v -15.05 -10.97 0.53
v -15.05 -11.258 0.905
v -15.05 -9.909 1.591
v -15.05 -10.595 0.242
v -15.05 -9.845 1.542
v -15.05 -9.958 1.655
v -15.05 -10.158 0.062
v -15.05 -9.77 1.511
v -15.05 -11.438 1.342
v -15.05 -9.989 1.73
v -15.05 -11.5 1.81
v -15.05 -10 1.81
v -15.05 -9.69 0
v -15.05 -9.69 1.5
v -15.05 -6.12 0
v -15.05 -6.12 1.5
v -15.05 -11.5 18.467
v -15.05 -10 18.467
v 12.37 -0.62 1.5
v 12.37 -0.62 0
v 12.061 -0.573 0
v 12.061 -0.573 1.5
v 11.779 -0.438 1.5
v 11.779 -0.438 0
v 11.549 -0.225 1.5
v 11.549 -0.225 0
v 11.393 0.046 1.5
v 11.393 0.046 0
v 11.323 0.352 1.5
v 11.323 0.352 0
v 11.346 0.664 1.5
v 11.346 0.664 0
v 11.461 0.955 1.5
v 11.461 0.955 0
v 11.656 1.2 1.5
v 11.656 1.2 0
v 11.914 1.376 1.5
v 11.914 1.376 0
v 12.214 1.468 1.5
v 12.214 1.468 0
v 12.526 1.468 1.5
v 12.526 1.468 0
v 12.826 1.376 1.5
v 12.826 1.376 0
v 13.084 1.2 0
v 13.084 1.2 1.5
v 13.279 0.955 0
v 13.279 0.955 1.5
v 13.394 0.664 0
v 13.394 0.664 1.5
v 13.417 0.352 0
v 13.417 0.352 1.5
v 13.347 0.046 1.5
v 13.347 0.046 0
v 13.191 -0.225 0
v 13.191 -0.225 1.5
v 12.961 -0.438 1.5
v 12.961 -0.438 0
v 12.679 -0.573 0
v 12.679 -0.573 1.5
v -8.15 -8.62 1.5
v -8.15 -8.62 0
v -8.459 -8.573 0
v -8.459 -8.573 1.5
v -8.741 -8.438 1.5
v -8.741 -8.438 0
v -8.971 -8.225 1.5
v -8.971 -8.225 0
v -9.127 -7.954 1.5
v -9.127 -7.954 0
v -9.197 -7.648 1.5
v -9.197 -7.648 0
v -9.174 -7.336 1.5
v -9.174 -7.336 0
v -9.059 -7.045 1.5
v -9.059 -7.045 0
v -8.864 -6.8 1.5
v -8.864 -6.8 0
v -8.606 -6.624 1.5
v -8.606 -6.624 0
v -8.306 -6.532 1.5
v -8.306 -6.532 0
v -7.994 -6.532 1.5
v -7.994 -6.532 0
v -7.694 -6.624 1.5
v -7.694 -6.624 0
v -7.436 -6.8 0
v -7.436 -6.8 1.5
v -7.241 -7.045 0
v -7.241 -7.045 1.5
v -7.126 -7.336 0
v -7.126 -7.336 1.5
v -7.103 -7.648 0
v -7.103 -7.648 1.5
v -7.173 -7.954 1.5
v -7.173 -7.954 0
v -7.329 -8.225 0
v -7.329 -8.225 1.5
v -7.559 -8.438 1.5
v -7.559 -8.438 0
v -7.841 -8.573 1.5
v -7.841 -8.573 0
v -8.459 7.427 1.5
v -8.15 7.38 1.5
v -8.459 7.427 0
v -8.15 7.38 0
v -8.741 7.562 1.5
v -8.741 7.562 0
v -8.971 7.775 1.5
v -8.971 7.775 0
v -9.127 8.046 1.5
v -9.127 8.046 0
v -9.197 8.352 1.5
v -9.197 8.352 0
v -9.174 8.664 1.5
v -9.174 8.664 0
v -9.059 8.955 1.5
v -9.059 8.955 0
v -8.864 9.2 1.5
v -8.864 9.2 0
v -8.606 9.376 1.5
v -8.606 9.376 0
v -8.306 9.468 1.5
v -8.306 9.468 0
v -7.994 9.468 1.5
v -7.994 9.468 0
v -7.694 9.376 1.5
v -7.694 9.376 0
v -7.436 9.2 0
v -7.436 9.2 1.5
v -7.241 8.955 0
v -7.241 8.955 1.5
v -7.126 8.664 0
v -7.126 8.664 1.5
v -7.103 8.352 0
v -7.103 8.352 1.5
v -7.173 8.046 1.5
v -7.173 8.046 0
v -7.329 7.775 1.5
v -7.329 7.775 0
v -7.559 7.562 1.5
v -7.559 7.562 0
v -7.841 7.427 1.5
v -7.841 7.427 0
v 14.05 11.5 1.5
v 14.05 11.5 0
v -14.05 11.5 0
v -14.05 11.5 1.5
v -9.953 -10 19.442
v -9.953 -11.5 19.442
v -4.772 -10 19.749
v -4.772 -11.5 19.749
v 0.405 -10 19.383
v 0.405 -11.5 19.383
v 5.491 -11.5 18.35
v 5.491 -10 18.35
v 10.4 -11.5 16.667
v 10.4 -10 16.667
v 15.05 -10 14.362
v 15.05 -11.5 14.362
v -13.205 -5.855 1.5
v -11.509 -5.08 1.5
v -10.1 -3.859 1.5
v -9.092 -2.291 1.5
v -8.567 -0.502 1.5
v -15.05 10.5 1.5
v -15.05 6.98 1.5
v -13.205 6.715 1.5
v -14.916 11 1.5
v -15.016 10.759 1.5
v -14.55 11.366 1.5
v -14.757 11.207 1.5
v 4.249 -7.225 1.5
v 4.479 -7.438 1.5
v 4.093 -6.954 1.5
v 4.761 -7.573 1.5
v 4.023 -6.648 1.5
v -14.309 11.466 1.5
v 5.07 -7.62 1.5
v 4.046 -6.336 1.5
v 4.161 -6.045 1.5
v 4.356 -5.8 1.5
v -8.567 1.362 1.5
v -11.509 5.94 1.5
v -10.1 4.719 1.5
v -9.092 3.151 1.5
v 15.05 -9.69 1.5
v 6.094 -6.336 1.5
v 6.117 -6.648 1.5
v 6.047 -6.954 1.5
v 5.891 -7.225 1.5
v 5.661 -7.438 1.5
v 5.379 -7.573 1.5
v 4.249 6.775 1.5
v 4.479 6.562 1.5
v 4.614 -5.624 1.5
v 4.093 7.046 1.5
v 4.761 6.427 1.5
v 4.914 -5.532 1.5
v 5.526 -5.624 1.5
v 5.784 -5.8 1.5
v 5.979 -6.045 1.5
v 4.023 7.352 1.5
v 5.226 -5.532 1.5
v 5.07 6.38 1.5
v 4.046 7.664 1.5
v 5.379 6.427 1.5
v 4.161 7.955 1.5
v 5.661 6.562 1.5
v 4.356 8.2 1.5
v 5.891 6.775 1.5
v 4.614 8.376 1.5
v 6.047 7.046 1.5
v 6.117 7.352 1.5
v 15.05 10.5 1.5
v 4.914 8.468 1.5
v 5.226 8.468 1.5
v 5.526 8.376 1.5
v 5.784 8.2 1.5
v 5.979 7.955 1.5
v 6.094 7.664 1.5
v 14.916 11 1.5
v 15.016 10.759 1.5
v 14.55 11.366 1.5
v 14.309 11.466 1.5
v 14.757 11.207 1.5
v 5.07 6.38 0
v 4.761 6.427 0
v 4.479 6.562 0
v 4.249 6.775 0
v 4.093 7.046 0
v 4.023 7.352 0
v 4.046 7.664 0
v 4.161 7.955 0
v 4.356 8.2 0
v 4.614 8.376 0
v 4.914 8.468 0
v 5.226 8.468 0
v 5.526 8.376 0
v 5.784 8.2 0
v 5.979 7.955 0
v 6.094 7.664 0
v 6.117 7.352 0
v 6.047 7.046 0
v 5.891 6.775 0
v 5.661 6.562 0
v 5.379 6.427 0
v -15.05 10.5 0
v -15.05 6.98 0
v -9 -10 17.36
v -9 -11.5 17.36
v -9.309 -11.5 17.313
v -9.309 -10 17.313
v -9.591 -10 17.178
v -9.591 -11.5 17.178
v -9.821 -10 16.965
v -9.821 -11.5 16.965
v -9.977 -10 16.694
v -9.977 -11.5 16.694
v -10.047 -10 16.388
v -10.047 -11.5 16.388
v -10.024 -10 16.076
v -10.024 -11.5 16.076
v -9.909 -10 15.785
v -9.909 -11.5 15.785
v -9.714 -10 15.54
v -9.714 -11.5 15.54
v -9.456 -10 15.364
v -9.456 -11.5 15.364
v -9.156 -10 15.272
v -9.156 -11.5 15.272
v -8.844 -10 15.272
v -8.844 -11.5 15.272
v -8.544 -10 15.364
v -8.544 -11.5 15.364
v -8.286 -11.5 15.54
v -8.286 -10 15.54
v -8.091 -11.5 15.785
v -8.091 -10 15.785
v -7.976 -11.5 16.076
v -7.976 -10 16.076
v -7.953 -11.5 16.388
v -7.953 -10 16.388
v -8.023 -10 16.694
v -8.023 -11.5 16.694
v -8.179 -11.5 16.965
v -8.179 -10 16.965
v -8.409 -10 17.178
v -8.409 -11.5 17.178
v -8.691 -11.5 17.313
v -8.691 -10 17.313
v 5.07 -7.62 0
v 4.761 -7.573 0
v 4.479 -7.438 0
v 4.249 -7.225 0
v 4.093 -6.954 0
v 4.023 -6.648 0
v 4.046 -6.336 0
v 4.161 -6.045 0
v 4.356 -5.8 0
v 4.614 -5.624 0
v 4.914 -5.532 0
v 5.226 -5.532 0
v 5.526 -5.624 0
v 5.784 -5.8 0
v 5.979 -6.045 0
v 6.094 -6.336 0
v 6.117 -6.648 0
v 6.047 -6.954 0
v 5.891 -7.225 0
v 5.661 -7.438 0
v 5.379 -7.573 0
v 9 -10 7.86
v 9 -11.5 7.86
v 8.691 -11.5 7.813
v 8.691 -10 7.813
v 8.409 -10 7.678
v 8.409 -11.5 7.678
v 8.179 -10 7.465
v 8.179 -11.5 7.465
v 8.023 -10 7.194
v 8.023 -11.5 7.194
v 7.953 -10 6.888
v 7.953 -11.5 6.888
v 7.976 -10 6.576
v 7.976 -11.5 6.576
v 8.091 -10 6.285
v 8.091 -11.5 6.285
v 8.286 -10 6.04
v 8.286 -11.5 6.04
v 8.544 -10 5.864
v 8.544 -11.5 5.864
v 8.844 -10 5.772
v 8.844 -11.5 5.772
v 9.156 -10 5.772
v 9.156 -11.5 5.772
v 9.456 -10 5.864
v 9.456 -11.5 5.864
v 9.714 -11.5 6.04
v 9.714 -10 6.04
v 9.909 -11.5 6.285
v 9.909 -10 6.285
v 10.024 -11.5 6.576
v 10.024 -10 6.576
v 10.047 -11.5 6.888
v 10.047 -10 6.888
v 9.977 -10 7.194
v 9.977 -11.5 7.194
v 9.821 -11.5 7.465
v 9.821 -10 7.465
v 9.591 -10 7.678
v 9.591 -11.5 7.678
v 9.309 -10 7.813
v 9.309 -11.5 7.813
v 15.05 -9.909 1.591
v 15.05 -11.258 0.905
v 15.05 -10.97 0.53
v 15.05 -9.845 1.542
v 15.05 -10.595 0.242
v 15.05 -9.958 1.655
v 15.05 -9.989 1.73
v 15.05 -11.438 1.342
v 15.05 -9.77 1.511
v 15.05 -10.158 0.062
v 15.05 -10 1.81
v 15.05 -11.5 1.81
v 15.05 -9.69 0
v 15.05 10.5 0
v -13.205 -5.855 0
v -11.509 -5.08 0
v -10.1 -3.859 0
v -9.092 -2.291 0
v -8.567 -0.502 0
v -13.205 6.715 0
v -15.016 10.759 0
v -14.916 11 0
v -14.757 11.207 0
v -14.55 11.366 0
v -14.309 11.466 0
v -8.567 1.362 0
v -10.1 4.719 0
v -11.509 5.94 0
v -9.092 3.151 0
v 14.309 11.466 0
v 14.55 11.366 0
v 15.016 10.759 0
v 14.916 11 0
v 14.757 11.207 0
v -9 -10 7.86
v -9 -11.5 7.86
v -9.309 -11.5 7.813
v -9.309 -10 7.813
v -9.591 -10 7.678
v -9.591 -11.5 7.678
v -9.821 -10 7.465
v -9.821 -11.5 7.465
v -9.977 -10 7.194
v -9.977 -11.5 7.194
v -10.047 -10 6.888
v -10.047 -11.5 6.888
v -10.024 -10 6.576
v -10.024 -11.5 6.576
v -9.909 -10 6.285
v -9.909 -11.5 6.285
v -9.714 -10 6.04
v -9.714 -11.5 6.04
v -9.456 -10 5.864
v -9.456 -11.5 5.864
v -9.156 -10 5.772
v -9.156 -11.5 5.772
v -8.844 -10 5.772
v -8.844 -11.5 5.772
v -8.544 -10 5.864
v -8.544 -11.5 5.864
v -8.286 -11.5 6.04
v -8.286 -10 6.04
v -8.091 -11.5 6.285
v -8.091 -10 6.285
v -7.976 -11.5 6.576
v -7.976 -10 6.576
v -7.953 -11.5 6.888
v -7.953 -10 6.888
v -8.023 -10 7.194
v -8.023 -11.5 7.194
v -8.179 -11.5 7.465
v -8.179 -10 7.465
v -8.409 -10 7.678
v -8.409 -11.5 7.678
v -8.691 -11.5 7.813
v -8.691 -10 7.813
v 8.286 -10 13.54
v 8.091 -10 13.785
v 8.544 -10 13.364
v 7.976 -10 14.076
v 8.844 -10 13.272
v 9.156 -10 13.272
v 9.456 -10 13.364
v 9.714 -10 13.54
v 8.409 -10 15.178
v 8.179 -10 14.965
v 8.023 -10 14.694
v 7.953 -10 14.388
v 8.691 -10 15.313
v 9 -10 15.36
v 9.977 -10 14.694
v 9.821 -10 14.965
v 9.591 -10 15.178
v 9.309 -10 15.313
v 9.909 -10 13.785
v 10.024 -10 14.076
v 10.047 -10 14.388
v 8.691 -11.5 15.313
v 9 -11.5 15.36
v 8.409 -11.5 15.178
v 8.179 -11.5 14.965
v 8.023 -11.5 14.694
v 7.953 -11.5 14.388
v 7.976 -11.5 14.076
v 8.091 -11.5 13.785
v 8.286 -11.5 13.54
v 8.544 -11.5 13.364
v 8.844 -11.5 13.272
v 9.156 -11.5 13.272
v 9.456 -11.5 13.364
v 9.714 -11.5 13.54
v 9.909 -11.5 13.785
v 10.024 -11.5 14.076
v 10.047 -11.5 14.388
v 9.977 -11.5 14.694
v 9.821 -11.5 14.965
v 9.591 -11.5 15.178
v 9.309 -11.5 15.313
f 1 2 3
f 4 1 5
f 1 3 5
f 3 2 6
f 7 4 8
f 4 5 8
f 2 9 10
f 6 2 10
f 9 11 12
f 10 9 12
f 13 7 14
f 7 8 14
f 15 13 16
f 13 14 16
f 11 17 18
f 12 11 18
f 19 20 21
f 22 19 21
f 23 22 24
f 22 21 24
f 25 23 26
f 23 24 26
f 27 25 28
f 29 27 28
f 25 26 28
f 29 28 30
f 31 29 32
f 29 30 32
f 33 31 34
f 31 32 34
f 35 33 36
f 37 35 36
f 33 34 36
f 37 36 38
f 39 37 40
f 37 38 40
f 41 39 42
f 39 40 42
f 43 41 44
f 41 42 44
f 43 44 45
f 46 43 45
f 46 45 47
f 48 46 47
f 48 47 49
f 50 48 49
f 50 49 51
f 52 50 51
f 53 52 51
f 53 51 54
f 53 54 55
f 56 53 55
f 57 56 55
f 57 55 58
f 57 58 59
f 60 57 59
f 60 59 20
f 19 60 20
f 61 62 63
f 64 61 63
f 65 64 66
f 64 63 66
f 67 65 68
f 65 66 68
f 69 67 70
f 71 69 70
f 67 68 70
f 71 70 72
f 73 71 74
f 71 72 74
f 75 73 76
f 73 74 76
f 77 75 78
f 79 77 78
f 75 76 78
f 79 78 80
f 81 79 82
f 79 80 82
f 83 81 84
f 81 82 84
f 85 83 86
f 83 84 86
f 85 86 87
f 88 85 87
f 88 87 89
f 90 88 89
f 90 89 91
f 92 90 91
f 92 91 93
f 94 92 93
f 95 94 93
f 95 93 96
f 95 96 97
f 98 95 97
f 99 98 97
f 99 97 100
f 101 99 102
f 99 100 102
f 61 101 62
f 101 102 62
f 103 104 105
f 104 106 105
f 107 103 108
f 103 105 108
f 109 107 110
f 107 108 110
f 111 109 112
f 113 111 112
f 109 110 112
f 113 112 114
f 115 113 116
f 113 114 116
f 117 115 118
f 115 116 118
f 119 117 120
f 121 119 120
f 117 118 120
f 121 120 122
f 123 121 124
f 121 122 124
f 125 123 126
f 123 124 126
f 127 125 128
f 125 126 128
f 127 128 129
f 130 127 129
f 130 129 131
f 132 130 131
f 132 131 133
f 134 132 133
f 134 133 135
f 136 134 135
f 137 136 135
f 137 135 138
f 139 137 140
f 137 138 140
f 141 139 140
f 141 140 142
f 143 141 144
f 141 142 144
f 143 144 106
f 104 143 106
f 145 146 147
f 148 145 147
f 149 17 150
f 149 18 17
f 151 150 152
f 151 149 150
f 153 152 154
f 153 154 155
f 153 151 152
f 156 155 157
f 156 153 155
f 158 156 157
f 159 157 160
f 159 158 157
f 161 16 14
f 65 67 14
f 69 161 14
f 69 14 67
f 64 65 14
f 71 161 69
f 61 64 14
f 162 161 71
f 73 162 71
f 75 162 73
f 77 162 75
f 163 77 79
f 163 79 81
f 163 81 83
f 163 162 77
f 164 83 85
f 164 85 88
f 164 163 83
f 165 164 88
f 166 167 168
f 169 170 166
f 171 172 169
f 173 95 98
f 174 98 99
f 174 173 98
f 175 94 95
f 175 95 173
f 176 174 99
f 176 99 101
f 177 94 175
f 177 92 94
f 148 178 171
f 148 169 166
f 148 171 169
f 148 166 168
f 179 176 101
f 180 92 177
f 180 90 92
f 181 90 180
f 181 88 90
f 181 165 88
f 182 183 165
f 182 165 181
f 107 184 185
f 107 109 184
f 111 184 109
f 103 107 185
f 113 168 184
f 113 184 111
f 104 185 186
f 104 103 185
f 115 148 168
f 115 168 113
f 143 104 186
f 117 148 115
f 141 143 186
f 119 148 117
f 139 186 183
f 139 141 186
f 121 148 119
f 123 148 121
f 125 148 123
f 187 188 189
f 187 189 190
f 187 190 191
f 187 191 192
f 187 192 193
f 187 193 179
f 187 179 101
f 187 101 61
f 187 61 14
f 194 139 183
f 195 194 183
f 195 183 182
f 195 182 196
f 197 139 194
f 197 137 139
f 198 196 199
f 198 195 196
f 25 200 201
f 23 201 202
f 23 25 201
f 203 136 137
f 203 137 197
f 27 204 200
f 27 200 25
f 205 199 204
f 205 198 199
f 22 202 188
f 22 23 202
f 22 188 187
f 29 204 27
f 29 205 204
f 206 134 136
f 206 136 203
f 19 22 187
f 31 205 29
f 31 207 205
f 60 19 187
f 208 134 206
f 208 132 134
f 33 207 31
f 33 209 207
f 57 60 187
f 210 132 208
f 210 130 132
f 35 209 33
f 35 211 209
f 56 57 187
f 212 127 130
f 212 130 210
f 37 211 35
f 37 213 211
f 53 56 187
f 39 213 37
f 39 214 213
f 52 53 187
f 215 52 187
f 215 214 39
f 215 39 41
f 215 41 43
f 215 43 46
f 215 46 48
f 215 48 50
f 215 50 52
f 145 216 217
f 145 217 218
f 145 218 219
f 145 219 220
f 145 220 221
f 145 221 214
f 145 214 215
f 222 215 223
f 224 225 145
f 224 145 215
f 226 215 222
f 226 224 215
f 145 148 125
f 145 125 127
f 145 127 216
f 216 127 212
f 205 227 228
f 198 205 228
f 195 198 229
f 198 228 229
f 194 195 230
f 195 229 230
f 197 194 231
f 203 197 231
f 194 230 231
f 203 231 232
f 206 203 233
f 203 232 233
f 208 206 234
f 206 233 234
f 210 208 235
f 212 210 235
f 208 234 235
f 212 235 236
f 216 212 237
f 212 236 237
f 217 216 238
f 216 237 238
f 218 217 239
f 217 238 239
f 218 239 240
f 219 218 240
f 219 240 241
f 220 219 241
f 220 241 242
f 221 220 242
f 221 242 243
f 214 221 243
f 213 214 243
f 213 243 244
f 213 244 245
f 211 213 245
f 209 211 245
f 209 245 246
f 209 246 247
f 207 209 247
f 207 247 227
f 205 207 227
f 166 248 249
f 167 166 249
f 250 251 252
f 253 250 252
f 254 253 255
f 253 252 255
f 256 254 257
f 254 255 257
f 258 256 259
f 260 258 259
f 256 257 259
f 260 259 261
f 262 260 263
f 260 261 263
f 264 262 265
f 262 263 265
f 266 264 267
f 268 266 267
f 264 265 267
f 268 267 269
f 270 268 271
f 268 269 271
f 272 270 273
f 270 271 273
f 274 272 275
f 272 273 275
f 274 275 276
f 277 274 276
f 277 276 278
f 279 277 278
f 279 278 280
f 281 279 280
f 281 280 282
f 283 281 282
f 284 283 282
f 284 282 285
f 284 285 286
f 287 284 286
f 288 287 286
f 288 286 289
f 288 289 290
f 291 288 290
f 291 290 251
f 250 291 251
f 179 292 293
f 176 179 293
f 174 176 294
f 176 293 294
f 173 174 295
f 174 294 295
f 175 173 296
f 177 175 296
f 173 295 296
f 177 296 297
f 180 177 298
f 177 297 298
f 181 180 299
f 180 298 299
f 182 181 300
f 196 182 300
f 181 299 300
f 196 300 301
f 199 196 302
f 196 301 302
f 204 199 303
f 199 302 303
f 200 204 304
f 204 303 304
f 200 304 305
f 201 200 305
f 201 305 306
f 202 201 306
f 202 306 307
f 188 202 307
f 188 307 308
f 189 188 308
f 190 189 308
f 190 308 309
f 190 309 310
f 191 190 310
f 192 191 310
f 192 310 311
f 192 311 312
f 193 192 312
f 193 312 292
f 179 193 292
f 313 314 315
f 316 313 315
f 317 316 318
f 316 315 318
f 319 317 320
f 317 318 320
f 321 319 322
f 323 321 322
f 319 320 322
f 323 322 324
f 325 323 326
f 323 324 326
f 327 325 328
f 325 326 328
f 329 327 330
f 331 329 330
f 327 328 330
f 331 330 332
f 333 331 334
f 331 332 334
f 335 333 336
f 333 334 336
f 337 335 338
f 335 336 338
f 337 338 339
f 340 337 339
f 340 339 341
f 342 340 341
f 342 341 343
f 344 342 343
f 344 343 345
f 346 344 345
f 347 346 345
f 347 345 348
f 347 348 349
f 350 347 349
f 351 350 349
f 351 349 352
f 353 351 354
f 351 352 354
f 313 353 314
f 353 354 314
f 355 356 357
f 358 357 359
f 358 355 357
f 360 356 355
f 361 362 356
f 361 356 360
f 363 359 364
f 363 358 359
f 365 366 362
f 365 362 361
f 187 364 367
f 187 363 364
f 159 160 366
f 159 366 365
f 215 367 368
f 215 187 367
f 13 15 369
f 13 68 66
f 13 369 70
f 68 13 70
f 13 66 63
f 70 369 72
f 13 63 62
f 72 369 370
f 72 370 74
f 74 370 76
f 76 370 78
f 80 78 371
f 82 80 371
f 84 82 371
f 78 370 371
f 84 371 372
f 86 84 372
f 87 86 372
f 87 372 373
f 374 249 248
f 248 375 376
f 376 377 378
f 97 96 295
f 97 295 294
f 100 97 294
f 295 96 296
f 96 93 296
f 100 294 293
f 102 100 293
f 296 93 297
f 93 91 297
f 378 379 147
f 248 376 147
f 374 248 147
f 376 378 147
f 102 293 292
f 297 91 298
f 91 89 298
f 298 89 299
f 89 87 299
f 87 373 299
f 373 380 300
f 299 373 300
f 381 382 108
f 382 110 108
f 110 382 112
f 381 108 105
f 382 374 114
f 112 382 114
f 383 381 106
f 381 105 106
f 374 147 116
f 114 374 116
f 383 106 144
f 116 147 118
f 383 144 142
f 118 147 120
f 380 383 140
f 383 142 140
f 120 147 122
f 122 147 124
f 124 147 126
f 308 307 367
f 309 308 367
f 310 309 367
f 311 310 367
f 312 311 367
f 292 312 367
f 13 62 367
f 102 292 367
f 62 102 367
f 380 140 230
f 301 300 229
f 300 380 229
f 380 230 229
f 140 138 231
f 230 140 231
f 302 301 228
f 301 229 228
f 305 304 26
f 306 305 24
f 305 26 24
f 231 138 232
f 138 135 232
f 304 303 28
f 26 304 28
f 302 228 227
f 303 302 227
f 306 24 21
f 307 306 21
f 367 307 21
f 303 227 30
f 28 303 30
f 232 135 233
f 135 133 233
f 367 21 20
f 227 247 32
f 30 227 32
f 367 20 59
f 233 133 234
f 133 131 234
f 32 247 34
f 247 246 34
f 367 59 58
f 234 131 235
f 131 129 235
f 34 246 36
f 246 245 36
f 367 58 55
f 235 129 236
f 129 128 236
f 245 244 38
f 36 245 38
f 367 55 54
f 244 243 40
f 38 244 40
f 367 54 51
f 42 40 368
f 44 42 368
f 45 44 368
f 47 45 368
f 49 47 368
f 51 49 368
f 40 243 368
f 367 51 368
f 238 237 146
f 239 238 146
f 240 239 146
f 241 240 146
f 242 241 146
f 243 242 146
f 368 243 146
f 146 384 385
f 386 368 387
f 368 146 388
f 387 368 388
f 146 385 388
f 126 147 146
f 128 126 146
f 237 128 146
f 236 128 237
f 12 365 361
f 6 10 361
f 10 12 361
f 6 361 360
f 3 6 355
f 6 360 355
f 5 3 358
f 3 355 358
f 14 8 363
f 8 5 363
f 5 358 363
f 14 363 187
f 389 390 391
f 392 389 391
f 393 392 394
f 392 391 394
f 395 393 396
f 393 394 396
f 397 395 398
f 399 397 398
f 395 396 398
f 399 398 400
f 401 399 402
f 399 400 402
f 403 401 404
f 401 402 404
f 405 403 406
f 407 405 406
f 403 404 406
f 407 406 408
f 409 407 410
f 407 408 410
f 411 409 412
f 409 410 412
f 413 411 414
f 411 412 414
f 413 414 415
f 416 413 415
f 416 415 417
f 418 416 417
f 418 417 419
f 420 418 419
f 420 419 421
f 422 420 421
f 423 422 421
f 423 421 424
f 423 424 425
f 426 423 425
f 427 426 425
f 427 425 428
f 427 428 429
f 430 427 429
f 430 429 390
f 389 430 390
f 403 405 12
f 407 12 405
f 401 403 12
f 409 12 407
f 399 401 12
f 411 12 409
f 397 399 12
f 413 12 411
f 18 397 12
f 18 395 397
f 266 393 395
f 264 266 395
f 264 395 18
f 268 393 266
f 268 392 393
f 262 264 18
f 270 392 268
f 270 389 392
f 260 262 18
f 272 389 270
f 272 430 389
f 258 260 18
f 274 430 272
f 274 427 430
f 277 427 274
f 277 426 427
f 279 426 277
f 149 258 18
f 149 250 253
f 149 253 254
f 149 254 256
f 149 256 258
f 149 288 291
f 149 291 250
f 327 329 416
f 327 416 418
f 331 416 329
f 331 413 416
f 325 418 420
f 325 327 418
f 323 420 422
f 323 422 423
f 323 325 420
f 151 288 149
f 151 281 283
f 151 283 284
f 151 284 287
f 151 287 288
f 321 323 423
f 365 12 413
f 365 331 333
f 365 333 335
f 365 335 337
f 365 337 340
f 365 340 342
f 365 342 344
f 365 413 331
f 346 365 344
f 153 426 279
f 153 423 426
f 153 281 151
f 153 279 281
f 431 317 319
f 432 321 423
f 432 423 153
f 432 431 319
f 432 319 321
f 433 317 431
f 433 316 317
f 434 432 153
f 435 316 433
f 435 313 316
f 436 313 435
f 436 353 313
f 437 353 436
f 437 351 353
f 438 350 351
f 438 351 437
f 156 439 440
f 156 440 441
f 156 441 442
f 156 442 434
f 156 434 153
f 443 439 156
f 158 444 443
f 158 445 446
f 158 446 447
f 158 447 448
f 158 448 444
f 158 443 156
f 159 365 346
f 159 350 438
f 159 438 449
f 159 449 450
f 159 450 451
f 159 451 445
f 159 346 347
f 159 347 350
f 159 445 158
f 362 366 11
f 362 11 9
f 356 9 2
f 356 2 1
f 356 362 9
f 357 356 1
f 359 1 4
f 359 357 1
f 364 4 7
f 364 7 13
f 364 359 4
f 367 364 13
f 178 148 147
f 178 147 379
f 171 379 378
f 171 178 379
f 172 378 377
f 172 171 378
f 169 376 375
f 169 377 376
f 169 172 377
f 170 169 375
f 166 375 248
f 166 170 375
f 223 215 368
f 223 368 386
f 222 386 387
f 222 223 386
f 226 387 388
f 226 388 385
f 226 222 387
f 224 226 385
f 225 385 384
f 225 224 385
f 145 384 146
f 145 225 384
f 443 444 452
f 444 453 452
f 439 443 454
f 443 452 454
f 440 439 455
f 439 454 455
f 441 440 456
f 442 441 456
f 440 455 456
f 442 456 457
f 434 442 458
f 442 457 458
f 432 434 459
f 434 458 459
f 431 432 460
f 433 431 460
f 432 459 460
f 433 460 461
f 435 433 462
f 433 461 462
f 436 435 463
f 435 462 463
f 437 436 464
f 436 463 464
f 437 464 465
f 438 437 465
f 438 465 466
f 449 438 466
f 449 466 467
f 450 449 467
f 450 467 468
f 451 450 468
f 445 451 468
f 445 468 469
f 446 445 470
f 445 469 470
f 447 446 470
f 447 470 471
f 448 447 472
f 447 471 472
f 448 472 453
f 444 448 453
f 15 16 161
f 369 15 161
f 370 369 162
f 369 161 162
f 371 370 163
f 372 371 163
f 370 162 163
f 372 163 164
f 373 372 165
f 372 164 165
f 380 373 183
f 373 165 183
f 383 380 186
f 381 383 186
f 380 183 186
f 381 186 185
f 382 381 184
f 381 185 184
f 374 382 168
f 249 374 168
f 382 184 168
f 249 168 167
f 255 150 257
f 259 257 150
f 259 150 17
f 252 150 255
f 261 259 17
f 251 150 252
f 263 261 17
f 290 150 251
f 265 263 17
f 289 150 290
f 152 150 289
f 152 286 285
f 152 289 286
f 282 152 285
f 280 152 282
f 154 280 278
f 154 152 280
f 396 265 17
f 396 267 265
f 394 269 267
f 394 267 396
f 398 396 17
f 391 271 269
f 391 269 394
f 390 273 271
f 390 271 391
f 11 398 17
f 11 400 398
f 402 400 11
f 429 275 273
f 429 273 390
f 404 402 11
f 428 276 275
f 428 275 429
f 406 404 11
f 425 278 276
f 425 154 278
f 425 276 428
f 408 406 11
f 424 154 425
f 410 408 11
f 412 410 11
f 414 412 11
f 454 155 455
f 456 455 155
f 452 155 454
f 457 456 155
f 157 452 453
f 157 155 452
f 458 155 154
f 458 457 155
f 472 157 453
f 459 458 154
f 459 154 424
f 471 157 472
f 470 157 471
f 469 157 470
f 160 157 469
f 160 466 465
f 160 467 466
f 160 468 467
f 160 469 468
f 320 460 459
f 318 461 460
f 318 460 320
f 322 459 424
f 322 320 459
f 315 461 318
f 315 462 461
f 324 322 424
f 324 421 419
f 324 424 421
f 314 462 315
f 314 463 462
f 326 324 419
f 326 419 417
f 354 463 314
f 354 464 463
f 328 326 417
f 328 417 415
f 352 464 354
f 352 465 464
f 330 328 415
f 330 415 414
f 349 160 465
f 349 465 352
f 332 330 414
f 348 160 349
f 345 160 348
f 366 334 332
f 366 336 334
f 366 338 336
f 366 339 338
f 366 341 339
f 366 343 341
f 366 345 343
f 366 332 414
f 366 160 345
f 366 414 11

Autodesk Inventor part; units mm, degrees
ref_plane "YZ Plane" through (0, 0, 0) normal (1, 0, 0) x (0, 1, 0)
ref_plane "XZ Plane" through (0, 0, 0) normal (0, 1, 0) x (-1, 0, 0)
ref_plane "XY Plane" through (0, 0, 0) normal (0, 0, 1) x (1, 0, 0)
sketch "Sketch1" plane through (0, 0, 0) normal (0, 0, 1) x (1, 0, 0)
  line L0 (-15.05, -11.5) -> (15.05, -11.5)
  line L1 (15.05, -11.5) -> (15.05, 11.5)
  line L2 (15.05, 11.5) -> (-15.05, 11.5)
  line L3 (-15.05, 11.5) -> (-15.05, -11.5)
  line L4 (-15.05, -11.5) -> (15.05, 11.5) construction
  line L5 (15.05, -11.5) -> (-15.05, 11.5) construction
  point P0 (0, 0)
  dimension "d0" = 30.1
  dimension "d1" = 23
extrude "Plate1" add sketch "Sketch1" along normal blind 1.5
sketch "Sketch6" plane through (0, 0, 1.5) normal (0, 0, 1) x (1, 0, 0)
  circle A0 centre (-8.15, 8.43) radius 0.7835 projected
  circle A1 centre (-8.15, -7.57) radius 0.7835 projected
  circle A2 centre (5.07, 7.43) radius 0.7835 projected
  circle A3 centre (5.07, -6.57) radius 0.7835 projected
  circle A4 centre (12.37, 0.43) radius 0.7835 projected
  point P0 (0, 0)
hole "Hole2" at (-8.15, 8.43, 1.5) at (5.07, 7.43, 1.5) at (12.37, 0.43, 1.5) at (5.07, -6.57, 1.5) at (-8.15, -7.57, 1.5) direction (0, 0, -1) diameter 2.1 end through all
sketch "Sketch7" plane through (0, 0, 1.5) normal (0, 0, 1) x (1, 0, 0)
  circle A0 centre (-15.05, 0.43) radius 6.4 projected
  circle A1 centre (-15.05, 0.43) radius 6.55
  point P0 (0, 0)
  dimension "d42" = 0.15
extrude "Cut1" cut sketch "Sketch7" against normal blind 1.5 contours A0 | A1
sketch "Sketch8" plane through (15.05, -10, 0) normal (0, -1, 0) x (1, 0, 0)
  line L0 (-30.1, 0) -> (0, 0)
  line L1 (0, 0) -> (0, 20)
  line L2 (0, 20) -> (-30.1, 20)
  line L3 (-30.1, 20) -> (-30.1, 0)
edge flange "Flange2" height 20 angle 90 thickness 1.5 bend radius 0.31 thickness toward (0, -1, 0) relief tear relief width 1.5 relief depth 0.75 edges at (0, -11.5, 1.5) wall of the first edge with corners at (-15.05, -10, 0) (15.05, -10, 0) (15.05, -10, 20) (-15.05, -10, 20)
bend "Bend2"
corner "Corner2"
sketch "Sketch9" plane through (-15.05, -10, 20) normal (0, 1, 0) x (1, 0, 0)
  circle A0 centre (10.05, 40.25) radius 40 projected
  circle A1 centre (10.05, 40.25) radius 50
  point P0 (15.05, 20)
  dimension "d39" = 10
extrude "Cut2" cut sketch "Sketch9" against normal blind 1.5
fillet "Corner Round1" radius 1 2 edges at (15.05, 11.5, 0.75) (-15.05, 11.5, 0.75)
sketch "Sketch10" plane through (-15.05, -10, 1.81) normal (0, 1, 0) x (1, 0, 0)
  line L0 (30.1, 0) -> (0, 0) projected
  arc A0 (0, -16.6569) -> (30.1, -12.5521) centre (10.05, 22.06) ccw projected
  line L1 (15.05, 0) -> (15.05, -17.6263) construction
  point P0 (15.05, 1.81)
  point P1 (6.05, -5)
  point P2 (24.05, -5)
  point P3 (24.05, -12.5)
  point P4 (6.05, -14.5)
  dimension "d44" = 18
  dimension "d45" = 9.5
  dimension "d46" = 7.5
  dimension "d47" = 5
hole "Hole3" at (-9, -10, 6.81) at (9, -10, 6.81) at (9, -10, 14.31) at (-9, -10, 16.31) direction (0, -1, 0) diameter 2.1 end through all
equation "\"d27\" = Thickness"
equation "\"d40\" = Thickness"
equation "\"d2\" = Thickness"
equation "\"d29\" = BendReliefWidth"
equation "\"d30\" = BendReliefDepth"
equation "\"d31\" = MinimumRemnant"
equation "\"d32\" = TransitionRadius"
equation "\"d35\" = BendRadius"
equation "\"d36\" = CornerReliefSize"
equation "\"d37\" = GapSize"
equation "\"d38\" = JacobiRadiusSize"
equation "\"BendReliefWidth\" = Thickness"
equation "\"BendReliefDepth\" = 0.5 * Thickness"
equation "\"CornerReliefSize\" = 4 * Thickness"
equation "\"MinimumRemnant\" = 2 * Thickness"
equation "\"TransitionRadius\" = BendRadius"
equation "\"JacobiRadiusSize\" = BendRadius"
equation "\"GapSize\" = Thickness"
equation "\"Thickness\" = 1.5"
equation "\"BendRadius\" = 0.31"
properties part number "axis_2_bottom_L_frame(top)" material "Aluminum 6061-AHC"
